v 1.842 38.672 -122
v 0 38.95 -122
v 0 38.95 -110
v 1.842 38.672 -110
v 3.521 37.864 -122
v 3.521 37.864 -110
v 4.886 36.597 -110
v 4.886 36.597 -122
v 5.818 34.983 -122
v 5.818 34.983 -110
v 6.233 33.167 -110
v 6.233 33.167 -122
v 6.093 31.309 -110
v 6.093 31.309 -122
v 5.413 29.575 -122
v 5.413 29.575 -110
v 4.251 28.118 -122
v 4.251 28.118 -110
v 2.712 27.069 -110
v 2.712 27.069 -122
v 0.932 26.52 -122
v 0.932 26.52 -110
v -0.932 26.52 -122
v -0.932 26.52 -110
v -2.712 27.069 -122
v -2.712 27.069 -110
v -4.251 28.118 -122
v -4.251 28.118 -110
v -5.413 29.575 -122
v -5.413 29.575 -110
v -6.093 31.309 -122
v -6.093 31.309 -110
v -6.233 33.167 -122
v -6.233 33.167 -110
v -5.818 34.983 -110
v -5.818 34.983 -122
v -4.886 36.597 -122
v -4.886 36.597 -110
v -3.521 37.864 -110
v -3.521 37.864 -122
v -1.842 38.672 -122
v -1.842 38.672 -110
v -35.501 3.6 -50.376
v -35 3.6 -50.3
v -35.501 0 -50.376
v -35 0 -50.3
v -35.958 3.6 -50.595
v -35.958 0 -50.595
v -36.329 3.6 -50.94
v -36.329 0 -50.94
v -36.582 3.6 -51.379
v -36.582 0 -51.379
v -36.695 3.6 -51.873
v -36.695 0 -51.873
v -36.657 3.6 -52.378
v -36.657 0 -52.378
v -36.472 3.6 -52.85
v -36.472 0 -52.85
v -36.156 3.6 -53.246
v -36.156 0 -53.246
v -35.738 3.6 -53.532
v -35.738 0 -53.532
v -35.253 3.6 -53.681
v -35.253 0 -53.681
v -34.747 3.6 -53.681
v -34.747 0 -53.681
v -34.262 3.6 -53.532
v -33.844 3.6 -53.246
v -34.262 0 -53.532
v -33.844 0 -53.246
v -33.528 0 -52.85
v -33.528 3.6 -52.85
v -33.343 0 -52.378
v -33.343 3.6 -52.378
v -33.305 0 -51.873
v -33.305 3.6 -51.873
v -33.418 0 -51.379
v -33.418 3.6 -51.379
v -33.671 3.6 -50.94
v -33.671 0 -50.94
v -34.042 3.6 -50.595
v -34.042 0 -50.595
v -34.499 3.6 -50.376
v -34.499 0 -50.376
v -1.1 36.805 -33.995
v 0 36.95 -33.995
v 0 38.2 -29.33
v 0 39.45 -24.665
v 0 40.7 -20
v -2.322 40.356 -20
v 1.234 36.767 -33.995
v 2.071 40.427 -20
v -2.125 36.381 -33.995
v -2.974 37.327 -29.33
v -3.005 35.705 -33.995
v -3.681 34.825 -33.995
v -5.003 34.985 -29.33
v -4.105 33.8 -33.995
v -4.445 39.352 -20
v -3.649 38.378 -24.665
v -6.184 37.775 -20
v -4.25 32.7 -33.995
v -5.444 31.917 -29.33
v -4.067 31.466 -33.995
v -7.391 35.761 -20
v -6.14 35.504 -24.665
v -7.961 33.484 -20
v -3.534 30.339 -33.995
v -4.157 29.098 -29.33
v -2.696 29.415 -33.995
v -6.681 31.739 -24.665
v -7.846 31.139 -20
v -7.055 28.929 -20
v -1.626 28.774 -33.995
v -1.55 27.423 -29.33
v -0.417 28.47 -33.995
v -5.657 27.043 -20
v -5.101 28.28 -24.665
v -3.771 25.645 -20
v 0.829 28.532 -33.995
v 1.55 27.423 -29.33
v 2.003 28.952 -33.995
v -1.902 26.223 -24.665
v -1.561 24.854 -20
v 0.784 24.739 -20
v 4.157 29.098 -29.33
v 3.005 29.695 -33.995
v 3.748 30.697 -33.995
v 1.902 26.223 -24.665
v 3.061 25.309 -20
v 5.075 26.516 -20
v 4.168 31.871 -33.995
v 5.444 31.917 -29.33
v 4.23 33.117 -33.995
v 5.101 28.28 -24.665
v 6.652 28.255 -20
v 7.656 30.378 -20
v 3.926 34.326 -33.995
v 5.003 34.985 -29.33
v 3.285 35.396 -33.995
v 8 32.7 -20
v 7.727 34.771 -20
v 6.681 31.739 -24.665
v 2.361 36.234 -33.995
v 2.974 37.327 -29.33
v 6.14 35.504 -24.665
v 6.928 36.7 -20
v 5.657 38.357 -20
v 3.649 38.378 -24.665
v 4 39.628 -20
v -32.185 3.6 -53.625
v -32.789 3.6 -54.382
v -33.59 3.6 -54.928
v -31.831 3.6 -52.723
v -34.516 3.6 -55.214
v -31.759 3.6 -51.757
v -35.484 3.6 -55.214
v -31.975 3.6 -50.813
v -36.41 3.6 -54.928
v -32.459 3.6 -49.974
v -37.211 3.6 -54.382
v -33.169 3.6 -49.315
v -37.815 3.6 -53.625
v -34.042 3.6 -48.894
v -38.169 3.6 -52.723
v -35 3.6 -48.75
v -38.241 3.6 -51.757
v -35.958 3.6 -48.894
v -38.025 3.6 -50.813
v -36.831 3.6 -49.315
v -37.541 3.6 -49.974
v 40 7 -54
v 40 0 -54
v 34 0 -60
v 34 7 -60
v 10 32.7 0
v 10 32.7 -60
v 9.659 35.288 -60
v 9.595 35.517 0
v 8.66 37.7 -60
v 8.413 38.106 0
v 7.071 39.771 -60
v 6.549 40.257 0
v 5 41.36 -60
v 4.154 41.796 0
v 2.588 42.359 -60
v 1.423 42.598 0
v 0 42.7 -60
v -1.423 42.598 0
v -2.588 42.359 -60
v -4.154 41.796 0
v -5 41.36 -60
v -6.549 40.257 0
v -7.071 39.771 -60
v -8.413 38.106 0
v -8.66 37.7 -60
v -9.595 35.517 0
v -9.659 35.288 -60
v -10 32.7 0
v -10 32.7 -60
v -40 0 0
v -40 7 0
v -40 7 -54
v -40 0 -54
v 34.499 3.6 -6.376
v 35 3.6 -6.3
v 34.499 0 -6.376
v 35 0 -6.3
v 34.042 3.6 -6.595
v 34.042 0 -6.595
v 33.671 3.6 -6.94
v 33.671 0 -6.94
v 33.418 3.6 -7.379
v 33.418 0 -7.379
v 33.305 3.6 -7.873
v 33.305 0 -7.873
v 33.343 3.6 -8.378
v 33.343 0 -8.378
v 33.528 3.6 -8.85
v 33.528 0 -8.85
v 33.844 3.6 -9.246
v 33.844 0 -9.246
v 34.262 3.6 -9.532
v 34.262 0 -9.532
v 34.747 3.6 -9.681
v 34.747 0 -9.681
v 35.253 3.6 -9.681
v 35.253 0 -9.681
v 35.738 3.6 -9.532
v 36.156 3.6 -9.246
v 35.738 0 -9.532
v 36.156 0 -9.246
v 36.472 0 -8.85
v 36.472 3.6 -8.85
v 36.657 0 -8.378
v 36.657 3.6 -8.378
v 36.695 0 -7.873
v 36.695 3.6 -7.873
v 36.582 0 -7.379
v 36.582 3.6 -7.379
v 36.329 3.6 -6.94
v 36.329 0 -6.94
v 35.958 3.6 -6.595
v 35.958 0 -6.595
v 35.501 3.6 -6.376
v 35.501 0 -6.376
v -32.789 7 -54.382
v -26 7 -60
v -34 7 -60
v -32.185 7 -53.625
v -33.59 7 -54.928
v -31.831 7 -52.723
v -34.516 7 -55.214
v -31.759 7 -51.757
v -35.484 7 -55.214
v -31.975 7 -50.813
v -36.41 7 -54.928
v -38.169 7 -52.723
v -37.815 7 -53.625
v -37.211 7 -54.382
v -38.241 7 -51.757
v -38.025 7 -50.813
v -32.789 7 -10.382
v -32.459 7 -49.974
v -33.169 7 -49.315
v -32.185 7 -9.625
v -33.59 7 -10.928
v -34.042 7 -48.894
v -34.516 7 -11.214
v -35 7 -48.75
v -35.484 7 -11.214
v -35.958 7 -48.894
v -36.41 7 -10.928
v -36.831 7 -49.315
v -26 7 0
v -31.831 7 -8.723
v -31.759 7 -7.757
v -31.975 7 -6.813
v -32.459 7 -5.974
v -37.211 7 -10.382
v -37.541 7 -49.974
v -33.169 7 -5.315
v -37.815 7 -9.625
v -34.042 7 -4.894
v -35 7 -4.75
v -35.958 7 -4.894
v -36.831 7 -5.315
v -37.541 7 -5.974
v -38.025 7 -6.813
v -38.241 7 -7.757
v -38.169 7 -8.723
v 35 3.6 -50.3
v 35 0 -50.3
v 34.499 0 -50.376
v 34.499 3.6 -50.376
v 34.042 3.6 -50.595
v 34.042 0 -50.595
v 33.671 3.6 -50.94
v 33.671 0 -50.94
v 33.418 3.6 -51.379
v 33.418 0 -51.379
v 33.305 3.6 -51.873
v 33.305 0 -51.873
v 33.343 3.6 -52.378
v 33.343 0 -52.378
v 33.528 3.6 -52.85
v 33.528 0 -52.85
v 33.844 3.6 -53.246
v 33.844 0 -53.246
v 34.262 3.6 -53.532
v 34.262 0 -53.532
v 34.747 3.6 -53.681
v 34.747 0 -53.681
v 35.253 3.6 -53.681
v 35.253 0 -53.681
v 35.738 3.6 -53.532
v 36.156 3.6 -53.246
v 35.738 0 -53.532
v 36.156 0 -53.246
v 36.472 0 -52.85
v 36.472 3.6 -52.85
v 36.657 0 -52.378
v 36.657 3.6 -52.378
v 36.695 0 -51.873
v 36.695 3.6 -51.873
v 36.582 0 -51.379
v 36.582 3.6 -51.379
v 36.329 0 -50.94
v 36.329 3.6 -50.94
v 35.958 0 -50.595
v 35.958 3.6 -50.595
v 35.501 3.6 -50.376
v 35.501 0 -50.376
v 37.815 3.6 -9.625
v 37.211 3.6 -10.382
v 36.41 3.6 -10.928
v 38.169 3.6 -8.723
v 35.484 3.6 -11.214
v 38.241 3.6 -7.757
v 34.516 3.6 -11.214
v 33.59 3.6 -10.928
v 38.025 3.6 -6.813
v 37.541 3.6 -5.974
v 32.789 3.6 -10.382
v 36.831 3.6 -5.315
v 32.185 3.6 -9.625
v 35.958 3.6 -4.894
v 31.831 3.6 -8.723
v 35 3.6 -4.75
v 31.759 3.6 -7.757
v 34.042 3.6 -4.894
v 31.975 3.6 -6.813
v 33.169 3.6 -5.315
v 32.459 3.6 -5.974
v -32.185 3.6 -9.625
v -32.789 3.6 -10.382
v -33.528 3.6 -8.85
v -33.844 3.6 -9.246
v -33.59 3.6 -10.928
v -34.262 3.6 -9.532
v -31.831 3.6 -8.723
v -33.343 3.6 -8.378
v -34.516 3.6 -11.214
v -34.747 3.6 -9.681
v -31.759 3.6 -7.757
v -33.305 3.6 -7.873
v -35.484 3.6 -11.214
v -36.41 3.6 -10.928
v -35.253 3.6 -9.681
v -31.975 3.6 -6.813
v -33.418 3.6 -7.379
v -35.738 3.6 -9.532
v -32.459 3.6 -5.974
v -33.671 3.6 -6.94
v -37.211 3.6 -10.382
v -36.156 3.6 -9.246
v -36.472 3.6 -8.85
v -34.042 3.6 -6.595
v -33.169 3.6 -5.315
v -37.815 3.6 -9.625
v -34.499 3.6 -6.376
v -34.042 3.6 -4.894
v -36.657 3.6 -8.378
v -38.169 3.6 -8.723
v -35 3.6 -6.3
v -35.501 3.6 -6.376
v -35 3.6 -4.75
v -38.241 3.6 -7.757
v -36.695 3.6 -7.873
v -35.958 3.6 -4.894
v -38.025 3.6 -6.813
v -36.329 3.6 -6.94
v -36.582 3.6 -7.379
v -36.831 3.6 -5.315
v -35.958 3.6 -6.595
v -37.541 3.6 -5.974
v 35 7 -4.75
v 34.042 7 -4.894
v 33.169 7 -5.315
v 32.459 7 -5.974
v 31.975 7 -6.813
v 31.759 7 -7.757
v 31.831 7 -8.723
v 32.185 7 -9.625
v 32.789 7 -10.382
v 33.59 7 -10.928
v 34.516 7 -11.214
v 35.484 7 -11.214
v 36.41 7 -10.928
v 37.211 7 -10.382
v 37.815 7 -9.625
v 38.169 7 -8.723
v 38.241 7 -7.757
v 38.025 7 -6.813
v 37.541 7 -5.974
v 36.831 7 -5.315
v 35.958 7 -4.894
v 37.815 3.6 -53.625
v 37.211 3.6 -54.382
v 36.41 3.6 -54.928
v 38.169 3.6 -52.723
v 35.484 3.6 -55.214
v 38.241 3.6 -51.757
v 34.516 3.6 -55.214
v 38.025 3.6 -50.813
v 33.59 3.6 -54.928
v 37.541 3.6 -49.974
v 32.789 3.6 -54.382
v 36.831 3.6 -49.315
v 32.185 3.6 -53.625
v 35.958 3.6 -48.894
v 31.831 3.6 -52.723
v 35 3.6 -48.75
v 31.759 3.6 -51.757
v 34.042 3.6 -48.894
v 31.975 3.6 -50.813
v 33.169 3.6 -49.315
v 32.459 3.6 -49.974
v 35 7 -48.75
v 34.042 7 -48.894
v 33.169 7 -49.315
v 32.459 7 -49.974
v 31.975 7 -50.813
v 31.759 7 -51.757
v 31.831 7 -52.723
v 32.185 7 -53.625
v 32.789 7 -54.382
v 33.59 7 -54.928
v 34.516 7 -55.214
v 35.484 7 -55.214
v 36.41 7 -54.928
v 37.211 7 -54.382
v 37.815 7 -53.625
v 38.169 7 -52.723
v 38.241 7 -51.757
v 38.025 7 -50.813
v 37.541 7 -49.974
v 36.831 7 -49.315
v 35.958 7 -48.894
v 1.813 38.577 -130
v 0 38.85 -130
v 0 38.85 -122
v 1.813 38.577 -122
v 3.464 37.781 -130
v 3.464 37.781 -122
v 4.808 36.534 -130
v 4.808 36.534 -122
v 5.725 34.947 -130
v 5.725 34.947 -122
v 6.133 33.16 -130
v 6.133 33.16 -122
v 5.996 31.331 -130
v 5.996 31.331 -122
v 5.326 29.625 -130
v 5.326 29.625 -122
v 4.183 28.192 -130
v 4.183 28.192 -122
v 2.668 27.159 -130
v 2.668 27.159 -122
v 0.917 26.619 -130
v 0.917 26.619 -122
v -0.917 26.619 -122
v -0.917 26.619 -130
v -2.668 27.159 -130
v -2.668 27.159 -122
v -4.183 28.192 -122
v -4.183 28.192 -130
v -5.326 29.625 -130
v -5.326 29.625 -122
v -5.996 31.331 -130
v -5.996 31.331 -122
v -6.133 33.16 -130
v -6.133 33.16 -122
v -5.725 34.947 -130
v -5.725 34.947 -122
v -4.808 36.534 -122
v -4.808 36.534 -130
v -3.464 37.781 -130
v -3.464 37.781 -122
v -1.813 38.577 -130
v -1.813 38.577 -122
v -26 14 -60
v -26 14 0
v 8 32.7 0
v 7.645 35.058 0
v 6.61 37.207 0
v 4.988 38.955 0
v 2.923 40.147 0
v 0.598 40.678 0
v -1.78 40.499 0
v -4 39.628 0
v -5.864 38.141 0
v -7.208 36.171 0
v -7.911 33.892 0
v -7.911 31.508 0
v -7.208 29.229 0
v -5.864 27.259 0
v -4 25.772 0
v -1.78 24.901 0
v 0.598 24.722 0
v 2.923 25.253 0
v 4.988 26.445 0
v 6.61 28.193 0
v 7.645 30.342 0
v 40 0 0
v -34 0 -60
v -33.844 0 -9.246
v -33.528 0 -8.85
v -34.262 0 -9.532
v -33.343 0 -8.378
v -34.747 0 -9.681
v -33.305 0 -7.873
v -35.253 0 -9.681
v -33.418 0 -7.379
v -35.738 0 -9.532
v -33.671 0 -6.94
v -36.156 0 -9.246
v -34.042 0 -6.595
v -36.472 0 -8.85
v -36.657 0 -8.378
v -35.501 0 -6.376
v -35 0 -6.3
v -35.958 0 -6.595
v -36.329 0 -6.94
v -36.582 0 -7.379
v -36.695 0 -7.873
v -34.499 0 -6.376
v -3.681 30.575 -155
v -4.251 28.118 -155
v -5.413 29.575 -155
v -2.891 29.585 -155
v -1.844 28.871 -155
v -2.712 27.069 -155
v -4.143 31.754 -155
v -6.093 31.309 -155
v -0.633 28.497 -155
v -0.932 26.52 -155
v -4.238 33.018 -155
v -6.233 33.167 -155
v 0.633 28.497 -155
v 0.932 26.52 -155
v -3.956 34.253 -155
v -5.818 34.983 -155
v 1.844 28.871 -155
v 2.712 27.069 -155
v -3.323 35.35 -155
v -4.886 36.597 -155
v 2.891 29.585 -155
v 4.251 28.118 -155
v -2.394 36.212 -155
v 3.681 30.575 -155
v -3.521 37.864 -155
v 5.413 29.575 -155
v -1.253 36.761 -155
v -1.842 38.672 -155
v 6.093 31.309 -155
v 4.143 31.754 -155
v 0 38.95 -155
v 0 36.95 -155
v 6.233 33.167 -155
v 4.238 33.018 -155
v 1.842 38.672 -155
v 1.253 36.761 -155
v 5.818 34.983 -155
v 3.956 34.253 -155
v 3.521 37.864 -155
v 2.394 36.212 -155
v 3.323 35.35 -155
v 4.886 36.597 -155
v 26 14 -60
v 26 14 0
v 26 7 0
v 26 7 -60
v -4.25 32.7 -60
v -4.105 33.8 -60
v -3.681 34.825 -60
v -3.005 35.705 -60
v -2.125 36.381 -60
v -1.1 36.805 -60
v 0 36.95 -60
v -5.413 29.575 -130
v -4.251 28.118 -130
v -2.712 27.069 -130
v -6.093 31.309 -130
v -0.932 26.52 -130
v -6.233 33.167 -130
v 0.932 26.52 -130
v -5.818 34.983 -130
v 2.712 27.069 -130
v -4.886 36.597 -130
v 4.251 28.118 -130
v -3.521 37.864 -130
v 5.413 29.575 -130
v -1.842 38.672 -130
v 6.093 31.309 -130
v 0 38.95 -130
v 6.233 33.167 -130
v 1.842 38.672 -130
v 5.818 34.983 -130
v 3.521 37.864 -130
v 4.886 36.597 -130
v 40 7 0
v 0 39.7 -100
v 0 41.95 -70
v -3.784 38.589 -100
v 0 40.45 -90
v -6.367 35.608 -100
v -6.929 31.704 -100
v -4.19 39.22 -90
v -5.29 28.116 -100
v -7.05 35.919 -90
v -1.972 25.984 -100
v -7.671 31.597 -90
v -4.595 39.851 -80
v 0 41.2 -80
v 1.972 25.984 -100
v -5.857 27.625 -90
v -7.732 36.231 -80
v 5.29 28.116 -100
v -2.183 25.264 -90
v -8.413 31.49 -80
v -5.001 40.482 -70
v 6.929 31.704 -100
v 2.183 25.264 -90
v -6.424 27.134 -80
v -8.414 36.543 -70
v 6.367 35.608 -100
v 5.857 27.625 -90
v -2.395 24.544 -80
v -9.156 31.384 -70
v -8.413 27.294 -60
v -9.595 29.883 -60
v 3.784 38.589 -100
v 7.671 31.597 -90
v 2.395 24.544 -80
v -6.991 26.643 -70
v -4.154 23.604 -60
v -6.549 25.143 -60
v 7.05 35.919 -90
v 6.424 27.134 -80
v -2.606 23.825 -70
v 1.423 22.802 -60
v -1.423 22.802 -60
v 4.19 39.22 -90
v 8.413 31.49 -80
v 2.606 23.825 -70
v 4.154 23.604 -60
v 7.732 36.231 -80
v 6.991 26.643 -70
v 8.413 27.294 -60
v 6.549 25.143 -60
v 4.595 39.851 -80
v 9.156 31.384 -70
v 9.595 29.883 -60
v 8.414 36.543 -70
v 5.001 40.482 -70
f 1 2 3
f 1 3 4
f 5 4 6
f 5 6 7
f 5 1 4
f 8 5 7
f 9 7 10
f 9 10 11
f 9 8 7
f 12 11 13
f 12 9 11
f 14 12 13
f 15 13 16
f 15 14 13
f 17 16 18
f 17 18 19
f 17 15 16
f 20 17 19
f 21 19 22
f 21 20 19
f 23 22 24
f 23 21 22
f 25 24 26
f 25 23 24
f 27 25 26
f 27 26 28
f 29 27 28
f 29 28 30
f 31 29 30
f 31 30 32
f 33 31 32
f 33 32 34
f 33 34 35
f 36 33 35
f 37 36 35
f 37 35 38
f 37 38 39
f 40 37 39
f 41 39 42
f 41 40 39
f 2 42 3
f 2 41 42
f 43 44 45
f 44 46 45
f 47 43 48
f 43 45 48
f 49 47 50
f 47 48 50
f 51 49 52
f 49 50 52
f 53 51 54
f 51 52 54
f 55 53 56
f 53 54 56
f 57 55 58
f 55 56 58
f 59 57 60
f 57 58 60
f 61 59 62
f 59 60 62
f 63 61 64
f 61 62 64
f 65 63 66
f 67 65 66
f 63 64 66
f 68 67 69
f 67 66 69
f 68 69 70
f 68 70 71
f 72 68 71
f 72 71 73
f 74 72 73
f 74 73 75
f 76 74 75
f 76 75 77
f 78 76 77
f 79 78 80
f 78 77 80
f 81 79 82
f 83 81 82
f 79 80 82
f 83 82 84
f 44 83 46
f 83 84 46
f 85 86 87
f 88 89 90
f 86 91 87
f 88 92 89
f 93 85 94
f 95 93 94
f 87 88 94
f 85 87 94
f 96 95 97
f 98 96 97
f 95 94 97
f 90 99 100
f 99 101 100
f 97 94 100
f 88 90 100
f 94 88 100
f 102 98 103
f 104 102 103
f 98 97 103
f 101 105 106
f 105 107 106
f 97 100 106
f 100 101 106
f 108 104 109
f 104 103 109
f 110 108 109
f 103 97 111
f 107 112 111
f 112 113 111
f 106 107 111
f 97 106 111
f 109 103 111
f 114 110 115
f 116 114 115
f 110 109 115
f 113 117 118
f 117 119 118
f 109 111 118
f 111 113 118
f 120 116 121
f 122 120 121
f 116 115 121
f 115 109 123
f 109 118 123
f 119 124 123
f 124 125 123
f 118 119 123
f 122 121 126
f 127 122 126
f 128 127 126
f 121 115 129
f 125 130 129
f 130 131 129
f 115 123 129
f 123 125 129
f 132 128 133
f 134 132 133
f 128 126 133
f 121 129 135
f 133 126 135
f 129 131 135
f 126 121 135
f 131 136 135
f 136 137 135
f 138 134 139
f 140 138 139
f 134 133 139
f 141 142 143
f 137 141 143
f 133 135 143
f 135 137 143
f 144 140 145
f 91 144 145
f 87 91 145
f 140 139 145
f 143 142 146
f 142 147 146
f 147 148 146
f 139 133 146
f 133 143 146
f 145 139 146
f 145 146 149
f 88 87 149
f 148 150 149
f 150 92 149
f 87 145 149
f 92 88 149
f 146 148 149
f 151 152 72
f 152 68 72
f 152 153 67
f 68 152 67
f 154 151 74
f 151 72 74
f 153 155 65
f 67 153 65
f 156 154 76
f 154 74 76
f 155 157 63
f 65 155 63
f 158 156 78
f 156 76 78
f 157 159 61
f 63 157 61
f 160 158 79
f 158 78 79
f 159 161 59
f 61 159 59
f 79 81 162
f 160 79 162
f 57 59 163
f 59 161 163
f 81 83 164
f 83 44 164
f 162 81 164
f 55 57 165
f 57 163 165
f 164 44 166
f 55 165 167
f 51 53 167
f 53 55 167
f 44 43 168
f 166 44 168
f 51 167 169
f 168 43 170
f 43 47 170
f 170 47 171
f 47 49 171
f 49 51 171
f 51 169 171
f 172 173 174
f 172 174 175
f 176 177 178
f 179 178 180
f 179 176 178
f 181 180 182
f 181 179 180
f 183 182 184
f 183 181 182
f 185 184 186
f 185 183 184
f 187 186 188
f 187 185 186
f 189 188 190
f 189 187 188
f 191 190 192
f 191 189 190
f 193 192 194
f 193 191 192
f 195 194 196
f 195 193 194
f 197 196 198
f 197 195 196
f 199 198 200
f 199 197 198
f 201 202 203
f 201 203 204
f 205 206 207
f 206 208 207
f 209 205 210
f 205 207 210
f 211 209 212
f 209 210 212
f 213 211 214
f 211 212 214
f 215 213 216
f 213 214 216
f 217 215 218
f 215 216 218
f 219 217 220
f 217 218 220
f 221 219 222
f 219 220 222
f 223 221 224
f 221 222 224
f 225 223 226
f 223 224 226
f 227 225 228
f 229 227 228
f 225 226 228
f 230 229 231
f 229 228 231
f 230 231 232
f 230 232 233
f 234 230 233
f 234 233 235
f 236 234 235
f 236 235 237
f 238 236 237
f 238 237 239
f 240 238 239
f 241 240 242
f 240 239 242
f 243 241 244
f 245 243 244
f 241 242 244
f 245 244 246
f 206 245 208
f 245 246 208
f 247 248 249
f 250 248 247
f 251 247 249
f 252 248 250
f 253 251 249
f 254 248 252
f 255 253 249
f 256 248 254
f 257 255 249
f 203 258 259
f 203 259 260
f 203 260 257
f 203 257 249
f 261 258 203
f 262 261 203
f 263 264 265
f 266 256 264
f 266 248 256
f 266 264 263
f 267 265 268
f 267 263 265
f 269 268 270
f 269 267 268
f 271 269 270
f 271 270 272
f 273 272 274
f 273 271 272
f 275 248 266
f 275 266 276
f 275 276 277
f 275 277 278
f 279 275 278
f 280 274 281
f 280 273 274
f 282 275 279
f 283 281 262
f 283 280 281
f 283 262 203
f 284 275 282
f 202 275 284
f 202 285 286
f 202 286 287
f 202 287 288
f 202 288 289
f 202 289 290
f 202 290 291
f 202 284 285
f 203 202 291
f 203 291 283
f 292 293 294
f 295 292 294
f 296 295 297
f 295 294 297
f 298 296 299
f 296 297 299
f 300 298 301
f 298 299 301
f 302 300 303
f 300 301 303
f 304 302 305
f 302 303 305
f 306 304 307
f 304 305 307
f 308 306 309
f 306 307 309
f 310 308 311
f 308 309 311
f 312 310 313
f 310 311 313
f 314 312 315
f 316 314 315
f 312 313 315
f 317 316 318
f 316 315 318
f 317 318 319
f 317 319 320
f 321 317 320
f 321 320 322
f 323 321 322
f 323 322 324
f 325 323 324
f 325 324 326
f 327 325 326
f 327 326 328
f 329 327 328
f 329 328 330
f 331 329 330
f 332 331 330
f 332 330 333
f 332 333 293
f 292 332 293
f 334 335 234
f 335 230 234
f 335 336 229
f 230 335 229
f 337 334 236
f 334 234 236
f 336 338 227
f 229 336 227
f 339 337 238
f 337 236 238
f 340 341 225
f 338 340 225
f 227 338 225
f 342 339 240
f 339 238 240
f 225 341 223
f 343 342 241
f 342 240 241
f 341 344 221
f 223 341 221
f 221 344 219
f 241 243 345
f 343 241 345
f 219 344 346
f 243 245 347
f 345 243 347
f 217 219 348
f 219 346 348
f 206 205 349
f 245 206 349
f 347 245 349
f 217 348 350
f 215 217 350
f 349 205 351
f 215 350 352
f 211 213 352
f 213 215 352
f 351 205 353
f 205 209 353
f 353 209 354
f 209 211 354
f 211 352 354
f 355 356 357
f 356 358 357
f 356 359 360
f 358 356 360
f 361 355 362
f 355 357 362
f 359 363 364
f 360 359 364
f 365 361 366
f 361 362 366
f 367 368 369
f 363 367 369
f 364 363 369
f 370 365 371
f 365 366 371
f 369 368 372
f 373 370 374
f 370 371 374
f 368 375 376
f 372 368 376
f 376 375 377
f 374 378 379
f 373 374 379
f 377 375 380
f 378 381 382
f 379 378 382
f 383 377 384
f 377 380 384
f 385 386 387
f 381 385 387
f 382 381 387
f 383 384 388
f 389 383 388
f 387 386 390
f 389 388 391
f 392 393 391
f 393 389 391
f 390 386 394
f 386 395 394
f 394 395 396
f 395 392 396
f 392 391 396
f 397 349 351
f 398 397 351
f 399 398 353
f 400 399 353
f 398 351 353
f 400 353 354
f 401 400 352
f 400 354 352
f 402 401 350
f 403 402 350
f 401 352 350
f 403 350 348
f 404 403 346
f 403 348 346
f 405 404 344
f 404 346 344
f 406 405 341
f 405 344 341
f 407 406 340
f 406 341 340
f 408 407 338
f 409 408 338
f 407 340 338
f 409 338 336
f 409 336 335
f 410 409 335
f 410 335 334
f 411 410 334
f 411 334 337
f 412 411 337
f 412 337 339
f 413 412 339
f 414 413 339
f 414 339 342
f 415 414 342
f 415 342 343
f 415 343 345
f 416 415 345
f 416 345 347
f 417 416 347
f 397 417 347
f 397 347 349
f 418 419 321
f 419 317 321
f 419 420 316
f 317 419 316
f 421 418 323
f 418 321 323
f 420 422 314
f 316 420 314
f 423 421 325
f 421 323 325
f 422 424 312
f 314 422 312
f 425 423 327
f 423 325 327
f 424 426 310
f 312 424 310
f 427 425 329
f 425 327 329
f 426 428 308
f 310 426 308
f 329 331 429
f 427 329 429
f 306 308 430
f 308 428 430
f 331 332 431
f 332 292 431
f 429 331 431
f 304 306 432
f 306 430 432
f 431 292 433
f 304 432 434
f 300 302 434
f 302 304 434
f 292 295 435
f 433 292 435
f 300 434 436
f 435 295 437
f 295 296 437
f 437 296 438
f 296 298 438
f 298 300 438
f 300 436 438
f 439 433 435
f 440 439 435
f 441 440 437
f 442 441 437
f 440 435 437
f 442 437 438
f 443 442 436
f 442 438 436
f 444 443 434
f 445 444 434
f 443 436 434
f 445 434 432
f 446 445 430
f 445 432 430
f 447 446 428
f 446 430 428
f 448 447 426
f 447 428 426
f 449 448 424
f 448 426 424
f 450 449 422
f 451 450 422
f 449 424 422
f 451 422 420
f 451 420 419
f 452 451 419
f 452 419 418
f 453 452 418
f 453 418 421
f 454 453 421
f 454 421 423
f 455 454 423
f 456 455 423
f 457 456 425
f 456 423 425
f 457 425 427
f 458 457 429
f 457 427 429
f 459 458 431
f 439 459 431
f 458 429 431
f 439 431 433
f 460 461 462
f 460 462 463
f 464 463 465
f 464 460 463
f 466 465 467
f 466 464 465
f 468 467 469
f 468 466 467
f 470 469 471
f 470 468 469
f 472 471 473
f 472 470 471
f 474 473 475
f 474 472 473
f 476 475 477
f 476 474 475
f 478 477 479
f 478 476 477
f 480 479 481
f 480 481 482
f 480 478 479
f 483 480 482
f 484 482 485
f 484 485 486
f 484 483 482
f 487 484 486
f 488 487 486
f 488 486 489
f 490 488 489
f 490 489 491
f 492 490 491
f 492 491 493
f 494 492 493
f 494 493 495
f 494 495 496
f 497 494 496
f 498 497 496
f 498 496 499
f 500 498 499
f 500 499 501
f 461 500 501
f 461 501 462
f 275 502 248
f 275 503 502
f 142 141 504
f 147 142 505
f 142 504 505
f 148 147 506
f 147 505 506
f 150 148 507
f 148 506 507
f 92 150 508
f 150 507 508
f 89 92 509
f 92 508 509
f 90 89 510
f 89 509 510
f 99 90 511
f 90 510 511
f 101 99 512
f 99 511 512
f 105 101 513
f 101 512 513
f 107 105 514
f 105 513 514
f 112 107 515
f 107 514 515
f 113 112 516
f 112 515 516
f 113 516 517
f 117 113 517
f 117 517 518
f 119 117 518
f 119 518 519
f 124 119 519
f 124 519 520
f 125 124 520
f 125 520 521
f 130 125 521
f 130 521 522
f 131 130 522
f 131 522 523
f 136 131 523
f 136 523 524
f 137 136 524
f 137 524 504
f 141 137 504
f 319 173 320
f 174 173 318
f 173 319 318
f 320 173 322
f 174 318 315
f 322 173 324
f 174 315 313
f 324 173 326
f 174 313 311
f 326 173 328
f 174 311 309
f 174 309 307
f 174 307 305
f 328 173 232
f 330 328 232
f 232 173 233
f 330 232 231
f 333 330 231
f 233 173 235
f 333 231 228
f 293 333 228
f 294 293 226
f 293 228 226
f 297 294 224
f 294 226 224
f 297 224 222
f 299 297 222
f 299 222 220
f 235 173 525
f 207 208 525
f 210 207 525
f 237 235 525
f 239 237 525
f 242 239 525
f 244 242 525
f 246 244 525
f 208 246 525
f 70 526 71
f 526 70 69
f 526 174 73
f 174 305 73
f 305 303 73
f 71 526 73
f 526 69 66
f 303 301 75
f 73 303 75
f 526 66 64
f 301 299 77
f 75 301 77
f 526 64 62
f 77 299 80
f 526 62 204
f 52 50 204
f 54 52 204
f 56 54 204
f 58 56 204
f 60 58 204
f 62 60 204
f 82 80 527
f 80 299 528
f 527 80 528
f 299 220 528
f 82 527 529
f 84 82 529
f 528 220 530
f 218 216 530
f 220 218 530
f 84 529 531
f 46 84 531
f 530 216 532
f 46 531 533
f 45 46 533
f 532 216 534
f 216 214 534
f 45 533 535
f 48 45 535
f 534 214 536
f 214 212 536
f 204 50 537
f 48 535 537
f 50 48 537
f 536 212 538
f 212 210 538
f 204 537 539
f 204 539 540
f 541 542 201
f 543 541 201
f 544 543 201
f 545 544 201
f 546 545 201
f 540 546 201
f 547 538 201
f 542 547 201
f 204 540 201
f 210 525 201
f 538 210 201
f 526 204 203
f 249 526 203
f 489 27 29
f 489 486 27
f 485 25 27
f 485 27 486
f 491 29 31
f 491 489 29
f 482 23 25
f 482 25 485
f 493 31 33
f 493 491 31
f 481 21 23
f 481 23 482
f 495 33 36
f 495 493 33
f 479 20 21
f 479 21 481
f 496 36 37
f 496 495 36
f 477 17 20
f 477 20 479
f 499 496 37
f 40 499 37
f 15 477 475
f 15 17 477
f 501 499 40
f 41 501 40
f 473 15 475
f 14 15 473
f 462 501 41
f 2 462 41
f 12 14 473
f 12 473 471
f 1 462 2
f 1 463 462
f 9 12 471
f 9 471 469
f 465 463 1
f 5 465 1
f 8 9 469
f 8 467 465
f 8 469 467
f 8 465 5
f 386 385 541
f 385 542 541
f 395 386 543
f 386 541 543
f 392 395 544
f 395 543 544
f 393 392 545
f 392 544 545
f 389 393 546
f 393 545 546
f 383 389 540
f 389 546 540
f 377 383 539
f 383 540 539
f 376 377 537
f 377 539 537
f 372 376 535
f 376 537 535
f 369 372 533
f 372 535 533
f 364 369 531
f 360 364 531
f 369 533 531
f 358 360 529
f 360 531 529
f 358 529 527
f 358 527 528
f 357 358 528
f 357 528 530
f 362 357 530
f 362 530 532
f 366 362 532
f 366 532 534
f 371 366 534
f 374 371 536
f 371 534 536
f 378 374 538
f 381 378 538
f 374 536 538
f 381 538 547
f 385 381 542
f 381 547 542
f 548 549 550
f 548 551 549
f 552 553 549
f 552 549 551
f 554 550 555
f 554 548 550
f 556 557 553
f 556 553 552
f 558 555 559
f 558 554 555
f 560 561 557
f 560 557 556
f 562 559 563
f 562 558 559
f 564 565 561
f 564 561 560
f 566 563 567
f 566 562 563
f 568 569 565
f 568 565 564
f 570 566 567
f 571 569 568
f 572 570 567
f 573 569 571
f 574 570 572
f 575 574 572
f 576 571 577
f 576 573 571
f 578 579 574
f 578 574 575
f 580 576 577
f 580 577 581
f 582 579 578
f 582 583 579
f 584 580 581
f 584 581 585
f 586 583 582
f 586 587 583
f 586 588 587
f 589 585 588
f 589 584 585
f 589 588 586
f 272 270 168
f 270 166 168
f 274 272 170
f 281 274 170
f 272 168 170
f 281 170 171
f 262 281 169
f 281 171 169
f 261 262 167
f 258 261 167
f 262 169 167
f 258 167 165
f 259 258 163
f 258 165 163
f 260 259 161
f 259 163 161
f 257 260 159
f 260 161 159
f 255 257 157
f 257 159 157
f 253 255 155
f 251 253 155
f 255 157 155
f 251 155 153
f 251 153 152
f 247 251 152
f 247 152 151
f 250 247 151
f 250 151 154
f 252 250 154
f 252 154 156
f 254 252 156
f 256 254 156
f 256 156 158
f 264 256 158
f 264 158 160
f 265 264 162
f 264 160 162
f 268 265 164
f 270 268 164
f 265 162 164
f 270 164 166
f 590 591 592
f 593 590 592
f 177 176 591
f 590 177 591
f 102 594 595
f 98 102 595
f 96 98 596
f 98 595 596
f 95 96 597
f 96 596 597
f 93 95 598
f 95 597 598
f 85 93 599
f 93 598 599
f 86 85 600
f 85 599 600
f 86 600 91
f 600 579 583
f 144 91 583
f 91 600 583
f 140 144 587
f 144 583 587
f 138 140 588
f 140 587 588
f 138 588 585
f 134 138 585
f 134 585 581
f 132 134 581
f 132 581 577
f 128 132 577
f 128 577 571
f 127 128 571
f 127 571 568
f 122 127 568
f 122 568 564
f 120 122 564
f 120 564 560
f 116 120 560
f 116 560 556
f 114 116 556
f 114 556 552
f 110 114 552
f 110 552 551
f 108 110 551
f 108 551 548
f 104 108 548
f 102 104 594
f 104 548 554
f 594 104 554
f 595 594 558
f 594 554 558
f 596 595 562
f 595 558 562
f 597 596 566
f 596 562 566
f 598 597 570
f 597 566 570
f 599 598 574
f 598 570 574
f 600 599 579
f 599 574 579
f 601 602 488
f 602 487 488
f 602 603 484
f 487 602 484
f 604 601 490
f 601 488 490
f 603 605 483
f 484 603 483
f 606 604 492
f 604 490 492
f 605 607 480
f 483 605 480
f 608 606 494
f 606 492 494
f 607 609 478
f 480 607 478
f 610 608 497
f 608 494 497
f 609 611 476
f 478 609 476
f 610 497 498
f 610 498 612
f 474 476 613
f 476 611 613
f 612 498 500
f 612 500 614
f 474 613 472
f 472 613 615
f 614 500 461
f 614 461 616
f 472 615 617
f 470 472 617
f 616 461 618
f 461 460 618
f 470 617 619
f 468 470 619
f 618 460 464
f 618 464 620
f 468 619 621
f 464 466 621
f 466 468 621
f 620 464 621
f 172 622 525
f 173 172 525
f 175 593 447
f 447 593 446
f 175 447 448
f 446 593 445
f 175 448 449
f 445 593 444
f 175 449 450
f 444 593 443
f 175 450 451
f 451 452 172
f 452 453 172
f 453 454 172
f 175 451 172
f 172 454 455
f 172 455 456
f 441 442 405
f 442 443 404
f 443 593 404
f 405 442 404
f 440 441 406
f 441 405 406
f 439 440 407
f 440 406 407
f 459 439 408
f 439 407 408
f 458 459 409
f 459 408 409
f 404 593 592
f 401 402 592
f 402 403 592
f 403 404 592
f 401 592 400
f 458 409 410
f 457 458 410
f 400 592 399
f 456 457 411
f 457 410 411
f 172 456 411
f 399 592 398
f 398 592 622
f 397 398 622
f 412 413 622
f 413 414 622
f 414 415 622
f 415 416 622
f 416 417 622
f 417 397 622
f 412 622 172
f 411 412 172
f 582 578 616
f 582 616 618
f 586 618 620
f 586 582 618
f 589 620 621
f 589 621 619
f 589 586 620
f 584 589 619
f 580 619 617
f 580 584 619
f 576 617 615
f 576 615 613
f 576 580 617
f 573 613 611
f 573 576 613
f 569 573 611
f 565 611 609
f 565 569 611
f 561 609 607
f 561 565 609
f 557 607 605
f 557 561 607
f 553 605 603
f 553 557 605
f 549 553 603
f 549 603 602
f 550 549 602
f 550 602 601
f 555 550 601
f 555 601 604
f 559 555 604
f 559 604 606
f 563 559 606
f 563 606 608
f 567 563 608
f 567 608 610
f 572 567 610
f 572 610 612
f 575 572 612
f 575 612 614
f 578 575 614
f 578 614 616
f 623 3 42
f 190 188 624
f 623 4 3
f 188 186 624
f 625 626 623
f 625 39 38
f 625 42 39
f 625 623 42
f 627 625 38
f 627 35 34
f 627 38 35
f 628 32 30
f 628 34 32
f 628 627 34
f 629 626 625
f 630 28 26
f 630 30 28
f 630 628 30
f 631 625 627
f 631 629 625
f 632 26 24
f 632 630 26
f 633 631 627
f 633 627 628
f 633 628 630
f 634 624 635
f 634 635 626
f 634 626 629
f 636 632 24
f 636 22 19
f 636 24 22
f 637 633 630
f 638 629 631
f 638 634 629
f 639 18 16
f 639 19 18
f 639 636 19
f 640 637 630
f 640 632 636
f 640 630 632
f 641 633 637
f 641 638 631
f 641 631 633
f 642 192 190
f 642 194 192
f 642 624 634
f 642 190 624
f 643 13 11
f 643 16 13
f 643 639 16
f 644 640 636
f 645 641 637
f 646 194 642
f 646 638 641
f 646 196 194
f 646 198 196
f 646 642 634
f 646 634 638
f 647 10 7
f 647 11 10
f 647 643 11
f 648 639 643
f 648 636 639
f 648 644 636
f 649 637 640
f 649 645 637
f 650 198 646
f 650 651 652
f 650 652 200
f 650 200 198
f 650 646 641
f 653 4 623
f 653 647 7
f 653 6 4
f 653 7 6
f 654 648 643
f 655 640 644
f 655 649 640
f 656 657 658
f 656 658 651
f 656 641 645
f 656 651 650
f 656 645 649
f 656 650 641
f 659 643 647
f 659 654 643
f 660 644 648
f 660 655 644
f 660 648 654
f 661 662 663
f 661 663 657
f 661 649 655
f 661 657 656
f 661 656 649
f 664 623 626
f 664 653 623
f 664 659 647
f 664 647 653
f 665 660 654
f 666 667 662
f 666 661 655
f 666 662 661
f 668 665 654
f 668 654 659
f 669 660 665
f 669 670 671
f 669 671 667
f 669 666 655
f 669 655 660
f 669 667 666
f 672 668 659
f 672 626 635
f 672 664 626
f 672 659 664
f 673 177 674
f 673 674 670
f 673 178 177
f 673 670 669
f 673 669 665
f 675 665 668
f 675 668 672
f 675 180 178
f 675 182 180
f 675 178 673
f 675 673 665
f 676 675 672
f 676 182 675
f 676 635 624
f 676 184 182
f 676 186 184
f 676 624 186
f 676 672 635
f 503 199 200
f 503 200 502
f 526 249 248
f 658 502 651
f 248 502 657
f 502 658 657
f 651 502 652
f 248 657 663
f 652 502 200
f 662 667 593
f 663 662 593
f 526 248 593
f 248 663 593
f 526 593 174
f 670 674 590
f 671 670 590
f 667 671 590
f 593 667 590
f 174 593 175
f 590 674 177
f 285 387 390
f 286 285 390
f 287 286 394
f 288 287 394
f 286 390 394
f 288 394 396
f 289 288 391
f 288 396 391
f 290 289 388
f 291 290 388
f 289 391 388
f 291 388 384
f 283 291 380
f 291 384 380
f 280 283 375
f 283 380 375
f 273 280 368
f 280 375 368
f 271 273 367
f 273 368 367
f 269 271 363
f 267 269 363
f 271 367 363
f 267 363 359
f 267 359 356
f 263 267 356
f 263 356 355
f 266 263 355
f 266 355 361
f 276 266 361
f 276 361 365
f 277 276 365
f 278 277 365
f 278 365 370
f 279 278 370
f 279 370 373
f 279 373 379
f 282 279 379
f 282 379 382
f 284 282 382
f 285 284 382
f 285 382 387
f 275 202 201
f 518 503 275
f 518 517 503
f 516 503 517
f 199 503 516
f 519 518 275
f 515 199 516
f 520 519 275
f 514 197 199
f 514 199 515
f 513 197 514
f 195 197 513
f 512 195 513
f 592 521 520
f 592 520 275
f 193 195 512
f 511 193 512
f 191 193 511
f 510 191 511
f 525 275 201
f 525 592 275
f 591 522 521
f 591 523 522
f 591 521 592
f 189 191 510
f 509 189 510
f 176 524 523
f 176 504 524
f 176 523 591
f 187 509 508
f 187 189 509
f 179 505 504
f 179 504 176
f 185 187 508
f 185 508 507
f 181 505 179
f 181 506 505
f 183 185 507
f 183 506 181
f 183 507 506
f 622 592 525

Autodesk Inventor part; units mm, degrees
ref_plane "YZ Plane" through (0, 0, 0) normal (1, 0, 0) x (0, 1, 0)
ref_plane "XZ Plane" through (0, 0, 0) normal (0, 1, 0) x (-1, 0, 0)
ref_plane "XY Plane" through (0, 0, 0) normal (0, 0, 1) x (1, 0, 0)
sketch "Sketch1" plane through (0, 0, 0) normal (0, 0, 1) x (1, 0, 0)
  arc A0 (10, 32.7) -> (-10, 32.7) centre (0, 32.7) ccw
  line L0 (-10, 32.7) -> (-26, 14)
  line L1 (-26, 14) -> (-26, 7)
  line L2 (-26, 7) -> (-40, 7)
  line L3 (-40, 7) -> (-40, 0)
  line L4 (-40, 0) -> (0, 0)
  line L5 (0, 32.7) -> (0, 0) construction
  line L6 (10, 32.7) -> (26, 14)
  line L7 (26, 14) -> (26, 7)
  line L8 (26, 7) -> (40, 7)
  line L9 (40, 7) -> (40, 0)
  line L10 (40, 0) -> (0, 0)
  line L11 (-10, 32.7) -> (10, 32.7) construction
  dimension "d4" = 10
  dimension "d5" = 80
  dimension "ToolGuidance_Base_Thickness" = 7
  dimension "d7" = 7
  dimension "d8" = 32.7
  dimension "d9" = 14
  dimension "d11" = 0
extrude "Extrusion1" add sketch "Sketch1" against normal blind 60
sketch "Sketch2" plane through (0, 0, 0) normal (0, 0, 1) x (1, 0, 0)
  arc A0 (10, 32.7) -> (-10, 32.7) centre (0, 32.7) ccw projected
  circle A1 centre (0, 32.7) radius 8
  point P0 (0, 0)
  dimension "d16" = 16
extrude "Extrusion2" cut sketch "Sketch2" against normal blind 20
sketch "Sketch3" plane through (0, 0, -60) normal (0, 0, -1) x (-1, 0, 0)
  circle A0 centre (0, 32.7) radius 8 projected
  circle A1 centre (0, 32.7) radius 4.25
  point P0 (0, 0)
  dimension "d19" = 8.5
extrude "Extrusion3" cut sketch "Sketch3" against normal blind 60 contours A1
sketch "Sketch4" plane through (-40, 7, 0) normal (0, 1, 0) x (1, 0, 0)
  circle A0 centre (5, 52) radius 2.25 construction
  line L0 (0, 60) -> (14, 60) construction
  line L1 (0, 0) -> (0, 60) construction
  circle A1 centre (5, 8) radius 2.25 construction
  line L2 (96, 0) -> (-16, 0) construction
  line L3 (40, 60) -> (40, 0) construction
  circle A2 centre (75, 52) radius 2.25 construction
  circle A3 centre (75, 8) radius 2.25 construction
  line L4 (80, 0) -> (80, 60) construction
  line L5 (66, 60) -> (80, 60) construction
  line L6 (75, 52) -> (75, 8) construction
  line L7 (5, 52) -> (5, 8) construction
  line L8 (0, 0) -> (0, 60) construction
  point P0 (73, 60)
  point P1 (7, 60)
  dimension "d25" = 4.5
  dimension "d26" = 8
  dimension "d28" = 4.5
  dimension "d29" = 8
  dimension "d54" = 44
  dimension "Guidacne_fixHoleDist" = 70
hole "Bohrung1" at (35, 7, -52) at (35, 7, -8) at (-35, 7, -8) at (-35, 7, -52) direction (0, -1, 0) diameter 3.4 end through all counterbore diameter 6.5 counterbore depth 3.4 clearance for "Inbusschraube DIN EN ISO 4762" size "M3" standard "DIN"
sketch "Sketch5" plane through (0, 0, 0) normal (1, 0, 0) x (0, 1, 0)
  line L0 (32.7, 0) -> (32.7, -60) projected
  line L1 (32.7, 0) -> (32.7, -180.9299)
  line L2 (32.7, -60) -> (42.7, -60) projected
  line L3 (42.7, -60) -> (38.95, -110)
  line L4 (38.95, -110) -> (38.95, -155)
  line L5 (36.95, -60) -> (36.95, -20) projected
  line L6 (36.95, -60) -> (36.95, -155)
  line L7 (36.95, -155) -> (38.95, -155)
  line L8 (42.7, 0) -> (32.7, 0) projected
  point P0 (0, 0)
  dimension "d34" = 2
  dimension "d35" = 155
  dimension "d36" = 110
revolve "Revolution1" add sketch "Sketch5" angle 360 about axis through (0, 32.7, 0) along (0, 0, -1)
sketch "Sketch6" plane through (0, 0, 0) normal (1, 0, 0) x (0, 1, 0)
  line L0 (32.7, 0) -> (32.7, -60) projected
  line L1 (32.7, -41.8536) -> (32.7, 16.9969)
  line L2 (24.7, -20) -> (40.7, -20) projected
  line L3 (40.7, -20) -> (36.95, -33.9952)
  line L4 (36.95, -155) -> (36.95, -20) projected
  line L5 (28.45, -20) -> (36.95, -20) projected
  line L6 (36.95, -33.9952) -> (36.95, -20)
  line L7 (36.95, -20) -> (40.7, -20)
  line L8 (36.95, -33.9952) -> (36.95, -20)
  line L9 (40.7, -20) -> (36.95, -20)
  point P0 (0, 0)
  dimension "d38" = 15
revolve "Revolution2" cut sketch "Sketch6" angle 360 about axis through (0, 32.7, -41.8536) along (0, 0, 1)
sketch "Sketch7" plane through (0, 0, 0) normal (1, 0, 0) x (0, 1, 0)
  line L0 (26.45, -110) -> (38.95, -110) projected
  line L1 (32.7, -110) -> (32.7, -160.0229)
  line L2 (38.95, -110) -> (38.95, -155) projected
  line L3 (38.95, -122) -> (38.85, -122)
  line L4 (38.85, -122) -> (38.85, -130)
  line L5 (38.85, -130) -> (38.95, -130)
  line L6 (38.95, -130) -> (38.95, -122)
  line L7 (42.7, 0) -> (32.7, 0) projected
  point P0 (0, 0)
  dimension "d40" = 0.1
  dimension "d41" = 122
  dimension "d42" = 8
revolve "Revolution3" cut sketch "Sketch7" angle 360 about axis through (0, 32.7, -110) along (0, 0, -1)
ref_plane "Arbeitsebene1" through (0, 32.7, -126) normal (0, 0, -1) x (-1, 0, 0)
ref_plane "Arbeitsebene2" through (26, 7, 0) normal (0, 0, 1) x (1, 0, 0)
chamfer "Fase2" distance 6 angle 45 2 edges at (-40, 3.5, -60) (40, 3.5, -60)
sketch "Skizze9" plane through (-40, 0, 0) normal (0, -1, 0) x (1, 0, 0)
  circle A0 centre (5, -52) radius 1.7 projected
  circle A1 centre (75, -8) radius 1.7 projected
  circle A2 centre (75, -52) radius 1.7 projected
  circle A3 centre (5, -8) radius 1.7 projected
  line L0 (80, -54) -> (74, -60) projected
  line L1 (80, 0) -> (80, -54) projected
  line L2 (0, 0) -> (80, 0) projected
  line L3 (0, 0) -> (0, -54) projected
  line L4 (6, -60) -> (0, -54) projected
  line L5 (74, -60) -> (6, -60) projected
  point P0 (40, 0)
equation "\"d5\" = GuidanceTrac_Width"
equation "\"d25\" = d28"
equation "\"GuidanceTrac_Width\" = 80"
properties part number "Guide" material "PBT-Kunststoff"
